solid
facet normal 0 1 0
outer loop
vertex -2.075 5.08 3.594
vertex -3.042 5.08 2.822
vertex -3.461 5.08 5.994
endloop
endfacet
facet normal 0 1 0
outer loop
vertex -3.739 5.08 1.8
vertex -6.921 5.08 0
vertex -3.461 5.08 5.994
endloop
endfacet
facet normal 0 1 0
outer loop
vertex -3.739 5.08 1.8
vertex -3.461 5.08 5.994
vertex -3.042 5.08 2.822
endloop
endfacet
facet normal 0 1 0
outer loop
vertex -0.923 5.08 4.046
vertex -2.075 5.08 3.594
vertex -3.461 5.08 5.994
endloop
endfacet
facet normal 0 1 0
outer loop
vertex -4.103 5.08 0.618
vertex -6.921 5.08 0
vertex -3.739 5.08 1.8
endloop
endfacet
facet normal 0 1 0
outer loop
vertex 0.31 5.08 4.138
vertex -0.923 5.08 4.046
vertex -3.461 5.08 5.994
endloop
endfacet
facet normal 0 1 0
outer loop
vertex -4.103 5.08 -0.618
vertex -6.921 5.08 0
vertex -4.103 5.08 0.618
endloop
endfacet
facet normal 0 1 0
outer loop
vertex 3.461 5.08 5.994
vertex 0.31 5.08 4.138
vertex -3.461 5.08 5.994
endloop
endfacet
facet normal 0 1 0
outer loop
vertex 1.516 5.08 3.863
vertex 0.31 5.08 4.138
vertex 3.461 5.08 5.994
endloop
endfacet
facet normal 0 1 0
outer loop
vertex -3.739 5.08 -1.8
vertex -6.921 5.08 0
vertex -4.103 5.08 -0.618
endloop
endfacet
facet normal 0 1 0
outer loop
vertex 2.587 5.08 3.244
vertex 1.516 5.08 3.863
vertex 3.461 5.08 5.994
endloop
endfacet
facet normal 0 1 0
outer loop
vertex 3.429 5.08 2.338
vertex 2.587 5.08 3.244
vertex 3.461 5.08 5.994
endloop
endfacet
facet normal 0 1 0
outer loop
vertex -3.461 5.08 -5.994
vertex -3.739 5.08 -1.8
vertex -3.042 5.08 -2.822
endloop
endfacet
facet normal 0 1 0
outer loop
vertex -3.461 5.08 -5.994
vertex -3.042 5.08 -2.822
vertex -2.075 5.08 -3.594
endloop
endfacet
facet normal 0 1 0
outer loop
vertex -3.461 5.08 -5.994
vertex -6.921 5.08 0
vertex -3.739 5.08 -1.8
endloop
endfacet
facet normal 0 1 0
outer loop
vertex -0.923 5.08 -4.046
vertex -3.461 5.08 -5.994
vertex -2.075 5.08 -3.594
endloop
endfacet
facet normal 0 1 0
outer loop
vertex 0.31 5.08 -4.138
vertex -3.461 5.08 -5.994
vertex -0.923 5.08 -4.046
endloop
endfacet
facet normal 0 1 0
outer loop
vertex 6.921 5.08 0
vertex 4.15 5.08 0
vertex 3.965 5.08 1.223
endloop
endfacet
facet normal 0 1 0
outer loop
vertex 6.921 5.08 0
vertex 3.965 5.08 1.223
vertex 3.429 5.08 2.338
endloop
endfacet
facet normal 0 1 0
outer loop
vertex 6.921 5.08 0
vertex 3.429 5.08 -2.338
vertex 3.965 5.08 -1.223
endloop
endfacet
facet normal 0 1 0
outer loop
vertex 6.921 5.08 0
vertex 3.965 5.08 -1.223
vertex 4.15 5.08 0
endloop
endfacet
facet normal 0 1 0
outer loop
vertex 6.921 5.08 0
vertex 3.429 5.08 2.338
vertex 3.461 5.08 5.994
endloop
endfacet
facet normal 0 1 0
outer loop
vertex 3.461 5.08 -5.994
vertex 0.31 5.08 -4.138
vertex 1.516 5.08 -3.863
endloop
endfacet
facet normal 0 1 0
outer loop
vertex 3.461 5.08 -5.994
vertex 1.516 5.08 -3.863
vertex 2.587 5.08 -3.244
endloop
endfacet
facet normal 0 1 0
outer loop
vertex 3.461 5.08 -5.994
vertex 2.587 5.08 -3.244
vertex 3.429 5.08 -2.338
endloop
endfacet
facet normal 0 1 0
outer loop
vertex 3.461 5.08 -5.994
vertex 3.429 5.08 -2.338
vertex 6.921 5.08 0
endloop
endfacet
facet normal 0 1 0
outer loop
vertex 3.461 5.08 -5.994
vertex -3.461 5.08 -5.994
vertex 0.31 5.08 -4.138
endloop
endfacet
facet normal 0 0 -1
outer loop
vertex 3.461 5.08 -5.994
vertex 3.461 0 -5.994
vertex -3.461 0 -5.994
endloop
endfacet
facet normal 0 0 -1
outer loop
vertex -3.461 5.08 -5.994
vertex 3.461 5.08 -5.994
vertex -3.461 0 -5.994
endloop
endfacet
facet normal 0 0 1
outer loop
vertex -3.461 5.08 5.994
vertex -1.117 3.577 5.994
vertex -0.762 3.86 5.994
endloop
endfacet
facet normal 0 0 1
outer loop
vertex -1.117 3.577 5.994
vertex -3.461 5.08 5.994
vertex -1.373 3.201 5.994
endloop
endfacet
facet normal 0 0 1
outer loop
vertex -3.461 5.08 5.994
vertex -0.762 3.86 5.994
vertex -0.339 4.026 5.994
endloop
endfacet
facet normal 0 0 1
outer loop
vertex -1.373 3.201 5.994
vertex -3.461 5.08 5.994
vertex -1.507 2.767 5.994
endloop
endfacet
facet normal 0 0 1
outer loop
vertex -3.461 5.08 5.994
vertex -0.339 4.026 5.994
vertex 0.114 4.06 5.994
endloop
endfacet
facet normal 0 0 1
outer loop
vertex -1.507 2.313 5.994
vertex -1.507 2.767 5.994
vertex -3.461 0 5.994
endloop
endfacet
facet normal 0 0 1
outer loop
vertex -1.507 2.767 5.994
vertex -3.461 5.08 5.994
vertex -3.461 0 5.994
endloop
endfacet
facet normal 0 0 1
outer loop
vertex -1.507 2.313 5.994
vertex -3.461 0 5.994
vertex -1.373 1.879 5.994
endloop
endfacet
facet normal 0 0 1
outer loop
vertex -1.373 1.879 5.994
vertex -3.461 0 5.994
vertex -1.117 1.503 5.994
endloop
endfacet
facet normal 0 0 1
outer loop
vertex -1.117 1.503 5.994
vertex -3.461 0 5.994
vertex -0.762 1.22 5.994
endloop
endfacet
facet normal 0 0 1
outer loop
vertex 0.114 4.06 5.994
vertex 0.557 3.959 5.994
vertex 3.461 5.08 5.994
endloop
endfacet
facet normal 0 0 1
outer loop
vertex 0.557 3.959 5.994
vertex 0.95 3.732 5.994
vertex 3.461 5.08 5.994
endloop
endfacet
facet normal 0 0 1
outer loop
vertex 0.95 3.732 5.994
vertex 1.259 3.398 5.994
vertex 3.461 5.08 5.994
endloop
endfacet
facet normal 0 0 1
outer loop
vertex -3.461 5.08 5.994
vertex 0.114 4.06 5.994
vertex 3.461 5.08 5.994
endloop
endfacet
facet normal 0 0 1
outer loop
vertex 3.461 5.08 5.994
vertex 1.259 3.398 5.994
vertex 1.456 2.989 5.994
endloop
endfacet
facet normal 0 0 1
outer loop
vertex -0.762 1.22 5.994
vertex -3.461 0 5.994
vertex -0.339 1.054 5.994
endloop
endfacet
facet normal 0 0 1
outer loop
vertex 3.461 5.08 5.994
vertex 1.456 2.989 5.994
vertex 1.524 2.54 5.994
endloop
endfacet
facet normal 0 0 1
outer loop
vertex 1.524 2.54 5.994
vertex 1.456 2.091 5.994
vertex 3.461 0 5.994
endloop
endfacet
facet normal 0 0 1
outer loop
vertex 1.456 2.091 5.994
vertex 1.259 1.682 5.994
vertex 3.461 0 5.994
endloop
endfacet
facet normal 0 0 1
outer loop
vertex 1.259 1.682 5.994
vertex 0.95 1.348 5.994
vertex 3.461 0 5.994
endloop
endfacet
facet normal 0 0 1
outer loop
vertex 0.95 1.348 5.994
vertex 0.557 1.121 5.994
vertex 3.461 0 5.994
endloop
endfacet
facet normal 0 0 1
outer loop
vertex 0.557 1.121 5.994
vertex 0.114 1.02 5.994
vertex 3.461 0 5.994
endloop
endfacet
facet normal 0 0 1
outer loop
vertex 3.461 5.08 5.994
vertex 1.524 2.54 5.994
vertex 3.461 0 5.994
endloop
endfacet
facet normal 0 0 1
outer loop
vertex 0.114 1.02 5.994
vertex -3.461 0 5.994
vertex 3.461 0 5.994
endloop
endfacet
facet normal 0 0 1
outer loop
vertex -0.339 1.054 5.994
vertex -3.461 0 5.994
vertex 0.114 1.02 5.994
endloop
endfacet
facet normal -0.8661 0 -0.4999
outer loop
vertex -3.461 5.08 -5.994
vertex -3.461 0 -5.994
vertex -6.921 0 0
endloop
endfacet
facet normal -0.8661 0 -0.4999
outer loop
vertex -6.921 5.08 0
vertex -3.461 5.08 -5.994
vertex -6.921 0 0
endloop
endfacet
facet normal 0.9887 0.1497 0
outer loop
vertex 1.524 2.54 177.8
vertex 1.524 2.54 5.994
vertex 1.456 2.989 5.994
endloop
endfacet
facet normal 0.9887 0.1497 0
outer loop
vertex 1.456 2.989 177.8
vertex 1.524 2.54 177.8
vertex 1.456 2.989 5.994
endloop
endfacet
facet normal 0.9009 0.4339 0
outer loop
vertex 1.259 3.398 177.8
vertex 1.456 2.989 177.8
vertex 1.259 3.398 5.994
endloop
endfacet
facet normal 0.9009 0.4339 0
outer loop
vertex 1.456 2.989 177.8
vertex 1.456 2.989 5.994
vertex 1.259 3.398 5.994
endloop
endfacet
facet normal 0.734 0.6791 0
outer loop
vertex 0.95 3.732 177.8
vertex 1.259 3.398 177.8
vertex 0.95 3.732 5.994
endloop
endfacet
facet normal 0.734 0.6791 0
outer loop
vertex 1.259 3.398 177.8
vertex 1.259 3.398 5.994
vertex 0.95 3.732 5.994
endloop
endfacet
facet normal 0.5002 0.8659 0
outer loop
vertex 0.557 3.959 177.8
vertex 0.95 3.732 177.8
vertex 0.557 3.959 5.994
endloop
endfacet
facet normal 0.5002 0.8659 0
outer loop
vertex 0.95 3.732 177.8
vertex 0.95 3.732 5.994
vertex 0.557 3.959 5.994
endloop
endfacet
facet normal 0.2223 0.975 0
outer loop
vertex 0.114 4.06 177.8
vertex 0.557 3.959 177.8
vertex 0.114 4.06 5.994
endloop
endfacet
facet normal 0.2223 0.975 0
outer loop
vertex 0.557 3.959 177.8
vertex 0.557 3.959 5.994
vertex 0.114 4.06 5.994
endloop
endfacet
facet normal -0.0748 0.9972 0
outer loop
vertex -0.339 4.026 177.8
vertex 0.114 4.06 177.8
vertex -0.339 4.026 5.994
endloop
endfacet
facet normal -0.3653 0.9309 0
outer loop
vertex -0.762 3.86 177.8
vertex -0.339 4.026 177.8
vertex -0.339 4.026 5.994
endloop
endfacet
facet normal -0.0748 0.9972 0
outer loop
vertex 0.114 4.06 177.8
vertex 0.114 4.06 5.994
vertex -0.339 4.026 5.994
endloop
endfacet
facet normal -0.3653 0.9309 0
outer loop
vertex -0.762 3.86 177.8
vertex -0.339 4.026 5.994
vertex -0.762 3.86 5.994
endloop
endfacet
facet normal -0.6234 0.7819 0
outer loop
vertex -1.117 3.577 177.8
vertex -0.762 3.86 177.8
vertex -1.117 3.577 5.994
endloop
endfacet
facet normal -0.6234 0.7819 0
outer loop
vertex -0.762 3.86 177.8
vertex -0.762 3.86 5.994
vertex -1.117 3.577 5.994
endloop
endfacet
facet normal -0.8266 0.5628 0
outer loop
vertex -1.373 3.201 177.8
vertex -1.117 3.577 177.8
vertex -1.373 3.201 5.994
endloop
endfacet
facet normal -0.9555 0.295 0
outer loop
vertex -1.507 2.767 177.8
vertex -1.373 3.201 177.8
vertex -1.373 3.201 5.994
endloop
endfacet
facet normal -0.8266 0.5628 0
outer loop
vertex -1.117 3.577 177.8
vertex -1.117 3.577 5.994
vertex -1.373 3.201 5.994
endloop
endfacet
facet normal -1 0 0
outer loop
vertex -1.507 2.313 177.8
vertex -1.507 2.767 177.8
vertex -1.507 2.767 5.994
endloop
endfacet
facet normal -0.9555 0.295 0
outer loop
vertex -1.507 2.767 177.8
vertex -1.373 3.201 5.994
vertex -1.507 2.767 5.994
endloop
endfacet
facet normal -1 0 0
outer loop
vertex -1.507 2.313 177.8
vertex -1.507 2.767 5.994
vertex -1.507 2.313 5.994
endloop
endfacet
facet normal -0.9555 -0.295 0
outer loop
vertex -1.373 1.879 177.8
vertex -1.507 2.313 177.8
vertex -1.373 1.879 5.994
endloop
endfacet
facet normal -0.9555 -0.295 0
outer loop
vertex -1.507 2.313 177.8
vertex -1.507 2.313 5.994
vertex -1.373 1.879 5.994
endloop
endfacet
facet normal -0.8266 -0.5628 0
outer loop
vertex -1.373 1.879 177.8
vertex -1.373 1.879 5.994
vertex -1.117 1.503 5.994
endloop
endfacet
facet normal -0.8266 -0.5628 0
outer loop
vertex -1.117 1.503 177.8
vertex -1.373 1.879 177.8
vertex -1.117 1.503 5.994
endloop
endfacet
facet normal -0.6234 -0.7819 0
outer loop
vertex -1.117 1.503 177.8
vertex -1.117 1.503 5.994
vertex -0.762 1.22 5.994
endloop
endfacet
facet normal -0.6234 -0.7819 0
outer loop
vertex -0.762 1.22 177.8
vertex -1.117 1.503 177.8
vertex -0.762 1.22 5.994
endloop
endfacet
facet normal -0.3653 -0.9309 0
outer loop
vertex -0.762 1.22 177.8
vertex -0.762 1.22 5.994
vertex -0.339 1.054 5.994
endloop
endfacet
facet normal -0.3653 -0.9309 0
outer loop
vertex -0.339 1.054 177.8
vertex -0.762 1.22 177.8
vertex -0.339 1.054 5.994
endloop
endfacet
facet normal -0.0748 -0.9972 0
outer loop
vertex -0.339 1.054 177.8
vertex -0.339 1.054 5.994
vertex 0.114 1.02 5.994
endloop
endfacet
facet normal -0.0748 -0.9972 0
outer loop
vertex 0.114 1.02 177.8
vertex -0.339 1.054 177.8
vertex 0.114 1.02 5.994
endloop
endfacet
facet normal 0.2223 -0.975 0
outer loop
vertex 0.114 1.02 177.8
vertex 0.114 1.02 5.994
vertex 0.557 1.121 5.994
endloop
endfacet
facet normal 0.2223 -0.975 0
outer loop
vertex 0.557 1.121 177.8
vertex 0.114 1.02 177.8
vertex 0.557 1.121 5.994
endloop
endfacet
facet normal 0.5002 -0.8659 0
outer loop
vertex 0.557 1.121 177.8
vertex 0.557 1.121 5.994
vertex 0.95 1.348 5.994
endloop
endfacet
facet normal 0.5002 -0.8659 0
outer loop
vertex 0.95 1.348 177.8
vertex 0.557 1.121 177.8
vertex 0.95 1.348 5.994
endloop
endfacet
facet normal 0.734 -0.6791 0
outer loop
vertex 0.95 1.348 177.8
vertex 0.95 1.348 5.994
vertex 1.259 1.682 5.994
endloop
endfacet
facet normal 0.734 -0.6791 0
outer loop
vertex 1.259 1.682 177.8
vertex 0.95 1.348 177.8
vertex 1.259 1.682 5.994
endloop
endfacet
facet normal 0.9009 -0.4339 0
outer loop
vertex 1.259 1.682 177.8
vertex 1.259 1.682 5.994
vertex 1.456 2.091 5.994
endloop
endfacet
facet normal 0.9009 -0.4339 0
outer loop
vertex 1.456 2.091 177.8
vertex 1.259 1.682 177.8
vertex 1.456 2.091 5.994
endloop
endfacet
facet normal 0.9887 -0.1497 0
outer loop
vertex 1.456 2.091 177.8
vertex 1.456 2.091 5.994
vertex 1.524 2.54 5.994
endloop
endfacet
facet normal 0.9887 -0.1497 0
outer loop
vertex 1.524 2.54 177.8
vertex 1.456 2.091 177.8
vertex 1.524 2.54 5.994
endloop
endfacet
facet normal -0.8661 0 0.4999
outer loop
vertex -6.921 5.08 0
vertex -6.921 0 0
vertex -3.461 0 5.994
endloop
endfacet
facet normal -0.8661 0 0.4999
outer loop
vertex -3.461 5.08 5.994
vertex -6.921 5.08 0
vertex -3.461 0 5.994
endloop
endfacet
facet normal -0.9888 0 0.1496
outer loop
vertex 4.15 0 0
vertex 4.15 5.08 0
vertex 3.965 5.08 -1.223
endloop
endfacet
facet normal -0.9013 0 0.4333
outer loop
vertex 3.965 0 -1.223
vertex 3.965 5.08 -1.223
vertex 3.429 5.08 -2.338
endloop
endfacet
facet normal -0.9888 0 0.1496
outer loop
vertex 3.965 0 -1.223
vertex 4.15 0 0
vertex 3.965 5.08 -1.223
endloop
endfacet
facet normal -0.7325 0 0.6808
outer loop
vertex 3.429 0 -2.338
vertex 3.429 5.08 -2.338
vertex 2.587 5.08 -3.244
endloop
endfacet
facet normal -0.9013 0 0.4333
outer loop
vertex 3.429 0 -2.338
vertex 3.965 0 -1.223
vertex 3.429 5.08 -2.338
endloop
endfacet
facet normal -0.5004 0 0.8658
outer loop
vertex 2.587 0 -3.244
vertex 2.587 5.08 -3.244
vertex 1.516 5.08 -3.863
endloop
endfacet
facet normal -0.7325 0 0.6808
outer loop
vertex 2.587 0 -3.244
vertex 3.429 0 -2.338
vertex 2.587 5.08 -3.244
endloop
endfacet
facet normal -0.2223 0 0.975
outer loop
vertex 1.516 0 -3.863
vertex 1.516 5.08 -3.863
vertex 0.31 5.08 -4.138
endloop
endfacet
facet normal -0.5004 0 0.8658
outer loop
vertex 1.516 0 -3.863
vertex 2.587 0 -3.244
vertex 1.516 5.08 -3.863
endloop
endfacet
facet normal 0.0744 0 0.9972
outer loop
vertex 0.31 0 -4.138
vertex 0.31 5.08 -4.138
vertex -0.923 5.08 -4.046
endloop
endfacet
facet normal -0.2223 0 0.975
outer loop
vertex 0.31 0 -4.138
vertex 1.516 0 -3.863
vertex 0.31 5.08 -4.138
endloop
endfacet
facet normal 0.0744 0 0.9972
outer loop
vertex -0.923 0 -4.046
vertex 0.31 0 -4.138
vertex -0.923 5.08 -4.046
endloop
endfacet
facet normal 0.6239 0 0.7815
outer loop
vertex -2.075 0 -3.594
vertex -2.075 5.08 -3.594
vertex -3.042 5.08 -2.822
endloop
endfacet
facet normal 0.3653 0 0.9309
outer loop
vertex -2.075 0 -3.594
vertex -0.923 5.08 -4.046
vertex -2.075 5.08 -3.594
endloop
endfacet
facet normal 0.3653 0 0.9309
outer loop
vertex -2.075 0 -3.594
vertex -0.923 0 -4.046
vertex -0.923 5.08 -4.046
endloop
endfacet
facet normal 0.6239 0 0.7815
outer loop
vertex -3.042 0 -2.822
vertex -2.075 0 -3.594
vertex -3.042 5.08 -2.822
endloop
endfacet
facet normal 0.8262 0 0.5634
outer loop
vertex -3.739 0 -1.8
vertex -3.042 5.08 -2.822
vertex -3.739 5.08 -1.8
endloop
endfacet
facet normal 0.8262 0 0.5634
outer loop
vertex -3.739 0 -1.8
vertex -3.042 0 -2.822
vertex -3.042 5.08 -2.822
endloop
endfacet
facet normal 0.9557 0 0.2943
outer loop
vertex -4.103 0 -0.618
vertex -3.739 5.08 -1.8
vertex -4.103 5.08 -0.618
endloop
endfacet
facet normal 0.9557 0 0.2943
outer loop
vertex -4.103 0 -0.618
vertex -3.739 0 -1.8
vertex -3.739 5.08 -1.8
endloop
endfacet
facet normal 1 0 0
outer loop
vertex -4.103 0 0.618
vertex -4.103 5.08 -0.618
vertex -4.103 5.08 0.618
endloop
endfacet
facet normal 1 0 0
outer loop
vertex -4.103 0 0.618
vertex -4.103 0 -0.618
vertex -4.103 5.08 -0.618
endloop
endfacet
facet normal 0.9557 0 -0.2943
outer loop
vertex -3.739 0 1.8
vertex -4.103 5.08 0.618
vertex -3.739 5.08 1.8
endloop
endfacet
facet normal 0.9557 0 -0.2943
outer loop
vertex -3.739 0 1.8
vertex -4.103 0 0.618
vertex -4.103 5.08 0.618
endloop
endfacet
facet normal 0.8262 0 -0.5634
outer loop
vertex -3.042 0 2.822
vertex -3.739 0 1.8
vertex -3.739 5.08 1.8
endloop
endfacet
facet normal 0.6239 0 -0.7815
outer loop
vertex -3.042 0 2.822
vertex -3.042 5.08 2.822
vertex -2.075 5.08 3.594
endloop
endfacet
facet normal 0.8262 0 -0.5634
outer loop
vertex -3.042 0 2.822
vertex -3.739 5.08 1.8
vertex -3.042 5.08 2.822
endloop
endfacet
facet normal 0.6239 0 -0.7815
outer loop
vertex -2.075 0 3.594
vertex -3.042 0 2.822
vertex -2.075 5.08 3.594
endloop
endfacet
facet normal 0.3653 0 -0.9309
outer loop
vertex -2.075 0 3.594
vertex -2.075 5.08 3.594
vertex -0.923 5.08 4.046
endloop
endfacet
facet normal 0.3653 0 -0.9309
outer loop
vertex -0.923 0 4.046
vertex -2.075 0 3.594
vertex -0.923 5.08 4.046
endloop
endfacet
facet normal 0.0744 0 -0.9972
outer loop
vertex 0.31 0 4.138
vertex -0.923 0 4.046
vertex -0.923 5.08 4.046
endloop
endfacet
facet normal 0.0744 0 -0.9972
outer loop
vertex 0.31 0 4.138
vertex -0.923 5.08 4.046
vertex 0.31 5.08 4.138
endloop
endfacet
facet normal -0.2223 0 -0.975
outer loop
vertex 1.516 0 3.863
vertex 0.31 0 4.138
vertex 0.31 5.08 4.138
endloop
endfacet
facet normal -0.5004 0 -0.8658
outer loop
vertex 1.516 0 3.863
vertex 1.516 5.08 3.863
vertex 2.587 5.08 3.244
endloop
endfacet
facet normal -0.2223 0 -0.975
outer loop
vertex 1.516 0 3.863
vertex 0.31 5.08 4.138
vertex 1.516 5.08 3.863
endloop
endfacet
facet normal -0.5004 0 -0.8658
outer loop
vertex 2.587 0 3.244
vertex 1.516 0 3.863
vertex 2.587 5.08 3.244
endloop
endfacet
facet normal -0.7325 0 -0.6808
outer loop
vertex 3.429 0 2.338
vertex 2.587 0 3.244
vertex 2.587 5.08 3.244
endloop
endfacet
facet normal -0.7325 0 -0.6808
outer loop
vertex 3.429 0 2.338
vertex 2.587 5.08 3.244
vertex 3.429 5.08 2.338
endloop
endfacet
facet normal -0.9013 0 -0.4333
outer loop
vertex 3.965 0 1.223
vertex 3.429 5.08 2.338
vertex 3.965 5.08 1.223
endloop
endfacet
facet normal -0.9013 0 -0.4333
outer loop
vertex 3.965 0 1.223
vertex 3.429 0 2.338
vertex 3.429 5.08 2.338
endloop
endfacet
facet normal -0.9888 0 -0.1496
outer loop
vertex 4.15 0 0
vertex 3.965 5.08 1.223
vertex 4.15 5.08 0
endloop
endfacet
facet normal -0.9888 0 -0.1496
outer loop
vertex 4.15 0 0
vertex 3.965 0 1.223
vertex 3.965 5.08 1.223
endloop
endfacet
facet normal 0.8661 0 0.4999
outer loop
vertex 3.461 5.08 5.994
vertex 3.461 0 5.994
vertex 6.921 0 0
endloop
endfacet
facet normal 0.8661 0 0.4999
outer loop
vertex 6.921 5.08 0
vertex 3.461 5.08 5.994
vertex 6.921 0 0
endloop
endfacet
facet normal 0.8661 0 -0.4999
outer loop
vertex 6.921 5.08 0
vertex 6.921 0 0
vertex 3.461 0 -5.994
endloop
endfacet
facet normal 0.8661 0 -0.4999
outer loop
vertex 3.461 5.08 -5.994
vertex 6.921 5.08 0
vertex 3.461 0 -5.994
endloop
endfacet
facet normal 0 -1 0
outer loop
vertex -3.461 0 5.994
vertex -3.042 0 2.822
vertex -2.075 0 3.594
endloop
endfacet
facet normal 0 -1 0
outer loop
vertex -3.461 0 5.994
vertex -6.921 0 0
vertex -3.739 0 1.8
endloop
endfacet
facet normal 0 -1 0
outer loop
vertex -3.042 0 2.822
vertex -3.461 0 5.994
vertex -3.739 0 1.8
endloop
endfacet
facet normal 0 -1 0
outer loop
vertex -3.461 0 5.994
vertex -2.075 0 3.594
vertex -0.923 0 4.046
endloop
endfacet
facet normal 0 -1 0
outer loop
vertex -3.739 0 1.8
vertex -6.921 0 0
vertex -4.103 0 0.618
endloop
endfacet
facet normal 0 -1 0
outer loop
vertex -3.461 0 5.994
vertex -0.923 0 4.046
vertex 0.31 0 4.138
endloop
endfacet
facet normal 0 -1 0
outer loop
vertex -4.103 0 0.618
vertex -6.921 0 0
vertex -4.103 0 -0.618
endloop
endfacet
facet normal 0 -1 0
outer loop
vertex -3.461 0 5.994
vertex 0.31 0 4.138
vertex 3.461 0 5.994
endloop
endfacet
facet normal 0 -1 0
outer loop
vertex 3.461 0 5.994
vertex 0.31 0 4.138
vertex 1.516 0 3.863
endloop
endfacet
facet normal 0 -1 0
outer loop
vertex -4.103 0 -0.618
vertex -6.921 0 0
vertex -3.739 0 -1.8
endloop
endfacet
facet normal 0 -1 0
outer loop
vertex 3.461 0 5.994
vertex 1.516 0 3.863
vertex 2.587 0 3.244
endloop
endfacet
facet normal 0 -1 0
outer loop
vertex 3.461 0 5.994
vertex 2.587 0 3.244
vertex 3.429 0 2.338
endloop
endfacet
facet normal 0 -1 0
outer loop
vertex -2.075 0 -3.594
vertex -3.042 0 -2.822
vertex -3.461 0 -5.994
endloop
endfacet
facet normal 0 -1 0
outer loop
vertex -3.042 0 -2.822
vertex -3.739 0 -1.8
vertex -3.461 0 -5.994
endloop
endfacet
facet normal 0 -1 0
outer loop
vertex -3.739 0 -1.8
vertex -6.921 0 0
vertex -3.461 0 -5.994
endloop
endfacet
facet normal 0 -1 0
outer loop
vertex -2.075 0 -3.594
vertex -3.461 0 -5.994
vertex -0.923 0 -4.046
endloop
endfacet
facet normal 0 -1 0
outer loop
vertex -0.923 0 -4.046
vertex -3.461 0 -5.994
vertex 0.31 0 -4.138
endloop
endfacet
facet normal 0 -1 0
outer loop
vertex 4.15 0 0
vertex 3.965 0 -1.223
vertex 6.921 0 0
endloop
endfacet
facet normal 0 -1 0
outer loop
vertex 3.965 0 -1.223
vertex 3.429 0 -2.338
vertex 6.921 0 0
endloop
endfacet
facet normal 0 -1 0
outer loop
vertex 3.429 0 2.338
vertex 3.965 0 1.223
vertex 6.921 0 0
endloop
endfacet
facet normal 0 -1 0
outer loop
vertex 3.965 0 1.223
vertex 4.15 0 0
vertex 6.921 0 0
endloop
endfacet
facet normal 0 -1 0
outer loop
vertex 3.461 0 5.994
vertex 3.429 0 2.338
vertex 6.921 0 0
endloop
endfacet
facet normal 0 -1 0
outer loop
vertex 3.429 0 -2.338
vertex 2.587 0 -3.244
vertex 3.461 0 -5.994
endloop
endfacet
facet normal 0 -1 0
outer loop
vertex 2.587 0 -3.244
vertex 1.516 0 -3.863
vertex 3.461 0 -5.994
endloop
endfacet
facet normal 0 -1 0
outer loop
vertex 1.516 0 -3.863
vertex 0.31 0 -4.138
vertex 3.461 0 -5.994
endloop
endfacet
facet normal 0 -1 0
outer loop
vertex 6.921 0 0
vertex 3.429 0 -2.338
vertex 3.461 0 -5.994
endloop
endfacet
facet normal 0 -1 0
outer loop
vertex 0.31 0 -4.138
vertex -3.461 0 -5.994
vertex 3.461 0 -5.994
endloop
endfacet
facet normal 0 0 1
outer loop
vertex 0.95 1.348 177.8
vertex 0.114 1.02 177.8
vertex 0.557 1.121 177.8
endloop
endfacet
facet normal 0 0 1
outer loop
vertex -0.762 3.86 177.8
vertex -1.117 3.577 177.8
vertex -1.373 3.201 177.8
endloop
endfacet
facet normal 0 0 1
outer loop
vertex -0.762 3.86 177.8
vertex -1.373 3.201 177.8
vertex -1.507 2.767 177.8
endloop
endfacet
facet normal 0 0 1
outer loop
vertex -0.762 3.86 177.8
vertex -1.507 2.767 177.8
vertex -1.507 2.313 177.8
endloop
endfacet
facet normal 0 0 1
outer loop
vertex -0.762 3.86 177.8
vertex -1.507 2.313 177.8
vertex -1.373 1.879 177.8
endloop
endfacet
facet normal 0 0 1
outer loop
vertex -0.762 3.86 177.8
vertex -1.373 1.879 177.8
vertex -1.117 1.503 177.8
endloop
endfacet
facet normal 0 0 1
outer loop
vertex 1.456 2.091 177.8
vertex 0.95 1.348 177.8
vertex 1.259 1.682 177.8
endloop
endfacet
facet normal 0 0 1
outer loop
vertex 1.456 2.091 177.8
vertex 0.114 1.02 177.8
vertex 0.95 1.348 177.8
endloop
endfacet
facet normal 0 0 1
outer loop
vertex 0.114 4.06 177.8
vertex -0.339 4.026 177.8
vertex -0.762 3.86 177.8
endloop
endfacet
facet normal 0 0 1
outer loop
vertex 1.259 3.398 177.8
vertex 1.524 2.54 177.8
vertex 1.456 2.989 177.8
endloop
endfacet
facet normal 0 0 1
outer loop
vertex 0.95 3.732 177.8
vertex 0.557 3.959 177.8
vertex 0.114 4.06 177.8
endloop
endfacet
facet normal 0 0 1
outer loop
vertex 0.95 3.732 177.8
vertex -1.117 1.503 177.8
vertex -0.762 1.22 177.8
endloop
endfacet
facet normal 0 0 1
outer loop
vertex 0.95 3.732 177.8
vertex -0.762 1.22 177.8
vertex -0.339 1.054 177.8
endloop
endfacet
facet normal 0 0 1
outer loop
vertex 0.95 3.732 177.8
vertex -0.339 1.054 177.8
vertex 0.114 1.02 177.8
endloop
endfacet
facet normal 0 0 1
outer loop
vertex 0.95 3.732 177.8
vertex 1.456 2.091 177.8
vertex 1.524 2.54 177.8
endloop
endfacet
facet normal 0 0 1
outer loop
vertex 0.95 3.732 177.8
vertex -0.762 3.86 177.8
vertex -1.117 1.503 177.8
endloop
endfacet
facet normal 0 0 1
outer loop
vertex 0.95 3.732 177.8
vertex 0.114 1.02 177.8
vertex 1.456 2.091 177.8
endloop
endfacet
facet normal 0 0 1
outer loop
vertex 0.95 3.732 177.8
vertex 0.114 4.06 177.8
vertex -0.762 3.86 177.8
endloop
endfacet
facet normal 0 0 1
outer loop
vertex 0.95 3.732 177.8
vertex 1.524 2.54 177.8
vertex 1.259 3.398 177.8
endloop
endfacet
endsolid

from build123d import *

# Parameters (mm, degrees)
CROQUIS1_R                   = 3.97256
SALIENTE_EXTRUIR2_DEPTH      = 5.08
CROQUIS2_R                   = 1.524
SALIENTE_EXTRUIR4_DEPTH      = 177.8
SALIENTE_EXTRUIR4_DEPTH_BACK = 2.54
CROQUIS3_R                   = 4.149655304
CORTAR_EXTRUIR1_DEPTH        = 20.32
CORTAR_EXTRUIR1_DEPTH_BACK   = 21.336


with BuildPart() as part:
    # Croquis1 → Saliente-Extruir2 (new body)
    with BuildSketch(Plane(origin=(0, 0, 0), x_dir=(1, 0, 0), z_dir=(0, 1, 0))):
        Polygon((6.921319842, 0), (3.460659921, 5.994038811), (-3.460659921, 5.994038811), (-6.921319842, 0), (-3.460659921, -5.994038811), (3.460659921, -5.994038811), align=None)
        Circle(CROQUIS1_R, mode=Mode.SUBTRACT)
    extrude(amount=SALIENTE_EXTRUIR2_DEPTH)

    # Croquis2 → Saliente-Extruir4 (add, two sides)
    with BuildSketch(Plane.XY) as saliente_extruir4_sk:
        with Locations((0, 2.54)):
            Circle(CROQUIS2_R)
    extrude(amount=SALIENTE_EXTRUIR4_DEPTH)
    extrude(saliente_extruir4_sk.sketch, amount=-SALIENTE_EXTRUIR4_DEPTH_BACK)

    # Croquis3 → Cortar-Extruir1 (cut, two sides)
    with BuildSketch(Plane(origin=(0, 0, 0), x_dir=(1, 0, 0), z_dir=(0, 1, 0))) as cortar_extruir1_sk:
        Circle(CROQUIS3_R)
    extrude(amount=CORTAR_EXTRUIR1_DEPTH, mode=Mode.SUBTRACT)
    extrude(cortar_extruir1_sk.sketch, amount=-CORTAR_EXTRUIR1_DEPTH_BACK, mode=Mode.SUBTRACT)


solid = part.part
